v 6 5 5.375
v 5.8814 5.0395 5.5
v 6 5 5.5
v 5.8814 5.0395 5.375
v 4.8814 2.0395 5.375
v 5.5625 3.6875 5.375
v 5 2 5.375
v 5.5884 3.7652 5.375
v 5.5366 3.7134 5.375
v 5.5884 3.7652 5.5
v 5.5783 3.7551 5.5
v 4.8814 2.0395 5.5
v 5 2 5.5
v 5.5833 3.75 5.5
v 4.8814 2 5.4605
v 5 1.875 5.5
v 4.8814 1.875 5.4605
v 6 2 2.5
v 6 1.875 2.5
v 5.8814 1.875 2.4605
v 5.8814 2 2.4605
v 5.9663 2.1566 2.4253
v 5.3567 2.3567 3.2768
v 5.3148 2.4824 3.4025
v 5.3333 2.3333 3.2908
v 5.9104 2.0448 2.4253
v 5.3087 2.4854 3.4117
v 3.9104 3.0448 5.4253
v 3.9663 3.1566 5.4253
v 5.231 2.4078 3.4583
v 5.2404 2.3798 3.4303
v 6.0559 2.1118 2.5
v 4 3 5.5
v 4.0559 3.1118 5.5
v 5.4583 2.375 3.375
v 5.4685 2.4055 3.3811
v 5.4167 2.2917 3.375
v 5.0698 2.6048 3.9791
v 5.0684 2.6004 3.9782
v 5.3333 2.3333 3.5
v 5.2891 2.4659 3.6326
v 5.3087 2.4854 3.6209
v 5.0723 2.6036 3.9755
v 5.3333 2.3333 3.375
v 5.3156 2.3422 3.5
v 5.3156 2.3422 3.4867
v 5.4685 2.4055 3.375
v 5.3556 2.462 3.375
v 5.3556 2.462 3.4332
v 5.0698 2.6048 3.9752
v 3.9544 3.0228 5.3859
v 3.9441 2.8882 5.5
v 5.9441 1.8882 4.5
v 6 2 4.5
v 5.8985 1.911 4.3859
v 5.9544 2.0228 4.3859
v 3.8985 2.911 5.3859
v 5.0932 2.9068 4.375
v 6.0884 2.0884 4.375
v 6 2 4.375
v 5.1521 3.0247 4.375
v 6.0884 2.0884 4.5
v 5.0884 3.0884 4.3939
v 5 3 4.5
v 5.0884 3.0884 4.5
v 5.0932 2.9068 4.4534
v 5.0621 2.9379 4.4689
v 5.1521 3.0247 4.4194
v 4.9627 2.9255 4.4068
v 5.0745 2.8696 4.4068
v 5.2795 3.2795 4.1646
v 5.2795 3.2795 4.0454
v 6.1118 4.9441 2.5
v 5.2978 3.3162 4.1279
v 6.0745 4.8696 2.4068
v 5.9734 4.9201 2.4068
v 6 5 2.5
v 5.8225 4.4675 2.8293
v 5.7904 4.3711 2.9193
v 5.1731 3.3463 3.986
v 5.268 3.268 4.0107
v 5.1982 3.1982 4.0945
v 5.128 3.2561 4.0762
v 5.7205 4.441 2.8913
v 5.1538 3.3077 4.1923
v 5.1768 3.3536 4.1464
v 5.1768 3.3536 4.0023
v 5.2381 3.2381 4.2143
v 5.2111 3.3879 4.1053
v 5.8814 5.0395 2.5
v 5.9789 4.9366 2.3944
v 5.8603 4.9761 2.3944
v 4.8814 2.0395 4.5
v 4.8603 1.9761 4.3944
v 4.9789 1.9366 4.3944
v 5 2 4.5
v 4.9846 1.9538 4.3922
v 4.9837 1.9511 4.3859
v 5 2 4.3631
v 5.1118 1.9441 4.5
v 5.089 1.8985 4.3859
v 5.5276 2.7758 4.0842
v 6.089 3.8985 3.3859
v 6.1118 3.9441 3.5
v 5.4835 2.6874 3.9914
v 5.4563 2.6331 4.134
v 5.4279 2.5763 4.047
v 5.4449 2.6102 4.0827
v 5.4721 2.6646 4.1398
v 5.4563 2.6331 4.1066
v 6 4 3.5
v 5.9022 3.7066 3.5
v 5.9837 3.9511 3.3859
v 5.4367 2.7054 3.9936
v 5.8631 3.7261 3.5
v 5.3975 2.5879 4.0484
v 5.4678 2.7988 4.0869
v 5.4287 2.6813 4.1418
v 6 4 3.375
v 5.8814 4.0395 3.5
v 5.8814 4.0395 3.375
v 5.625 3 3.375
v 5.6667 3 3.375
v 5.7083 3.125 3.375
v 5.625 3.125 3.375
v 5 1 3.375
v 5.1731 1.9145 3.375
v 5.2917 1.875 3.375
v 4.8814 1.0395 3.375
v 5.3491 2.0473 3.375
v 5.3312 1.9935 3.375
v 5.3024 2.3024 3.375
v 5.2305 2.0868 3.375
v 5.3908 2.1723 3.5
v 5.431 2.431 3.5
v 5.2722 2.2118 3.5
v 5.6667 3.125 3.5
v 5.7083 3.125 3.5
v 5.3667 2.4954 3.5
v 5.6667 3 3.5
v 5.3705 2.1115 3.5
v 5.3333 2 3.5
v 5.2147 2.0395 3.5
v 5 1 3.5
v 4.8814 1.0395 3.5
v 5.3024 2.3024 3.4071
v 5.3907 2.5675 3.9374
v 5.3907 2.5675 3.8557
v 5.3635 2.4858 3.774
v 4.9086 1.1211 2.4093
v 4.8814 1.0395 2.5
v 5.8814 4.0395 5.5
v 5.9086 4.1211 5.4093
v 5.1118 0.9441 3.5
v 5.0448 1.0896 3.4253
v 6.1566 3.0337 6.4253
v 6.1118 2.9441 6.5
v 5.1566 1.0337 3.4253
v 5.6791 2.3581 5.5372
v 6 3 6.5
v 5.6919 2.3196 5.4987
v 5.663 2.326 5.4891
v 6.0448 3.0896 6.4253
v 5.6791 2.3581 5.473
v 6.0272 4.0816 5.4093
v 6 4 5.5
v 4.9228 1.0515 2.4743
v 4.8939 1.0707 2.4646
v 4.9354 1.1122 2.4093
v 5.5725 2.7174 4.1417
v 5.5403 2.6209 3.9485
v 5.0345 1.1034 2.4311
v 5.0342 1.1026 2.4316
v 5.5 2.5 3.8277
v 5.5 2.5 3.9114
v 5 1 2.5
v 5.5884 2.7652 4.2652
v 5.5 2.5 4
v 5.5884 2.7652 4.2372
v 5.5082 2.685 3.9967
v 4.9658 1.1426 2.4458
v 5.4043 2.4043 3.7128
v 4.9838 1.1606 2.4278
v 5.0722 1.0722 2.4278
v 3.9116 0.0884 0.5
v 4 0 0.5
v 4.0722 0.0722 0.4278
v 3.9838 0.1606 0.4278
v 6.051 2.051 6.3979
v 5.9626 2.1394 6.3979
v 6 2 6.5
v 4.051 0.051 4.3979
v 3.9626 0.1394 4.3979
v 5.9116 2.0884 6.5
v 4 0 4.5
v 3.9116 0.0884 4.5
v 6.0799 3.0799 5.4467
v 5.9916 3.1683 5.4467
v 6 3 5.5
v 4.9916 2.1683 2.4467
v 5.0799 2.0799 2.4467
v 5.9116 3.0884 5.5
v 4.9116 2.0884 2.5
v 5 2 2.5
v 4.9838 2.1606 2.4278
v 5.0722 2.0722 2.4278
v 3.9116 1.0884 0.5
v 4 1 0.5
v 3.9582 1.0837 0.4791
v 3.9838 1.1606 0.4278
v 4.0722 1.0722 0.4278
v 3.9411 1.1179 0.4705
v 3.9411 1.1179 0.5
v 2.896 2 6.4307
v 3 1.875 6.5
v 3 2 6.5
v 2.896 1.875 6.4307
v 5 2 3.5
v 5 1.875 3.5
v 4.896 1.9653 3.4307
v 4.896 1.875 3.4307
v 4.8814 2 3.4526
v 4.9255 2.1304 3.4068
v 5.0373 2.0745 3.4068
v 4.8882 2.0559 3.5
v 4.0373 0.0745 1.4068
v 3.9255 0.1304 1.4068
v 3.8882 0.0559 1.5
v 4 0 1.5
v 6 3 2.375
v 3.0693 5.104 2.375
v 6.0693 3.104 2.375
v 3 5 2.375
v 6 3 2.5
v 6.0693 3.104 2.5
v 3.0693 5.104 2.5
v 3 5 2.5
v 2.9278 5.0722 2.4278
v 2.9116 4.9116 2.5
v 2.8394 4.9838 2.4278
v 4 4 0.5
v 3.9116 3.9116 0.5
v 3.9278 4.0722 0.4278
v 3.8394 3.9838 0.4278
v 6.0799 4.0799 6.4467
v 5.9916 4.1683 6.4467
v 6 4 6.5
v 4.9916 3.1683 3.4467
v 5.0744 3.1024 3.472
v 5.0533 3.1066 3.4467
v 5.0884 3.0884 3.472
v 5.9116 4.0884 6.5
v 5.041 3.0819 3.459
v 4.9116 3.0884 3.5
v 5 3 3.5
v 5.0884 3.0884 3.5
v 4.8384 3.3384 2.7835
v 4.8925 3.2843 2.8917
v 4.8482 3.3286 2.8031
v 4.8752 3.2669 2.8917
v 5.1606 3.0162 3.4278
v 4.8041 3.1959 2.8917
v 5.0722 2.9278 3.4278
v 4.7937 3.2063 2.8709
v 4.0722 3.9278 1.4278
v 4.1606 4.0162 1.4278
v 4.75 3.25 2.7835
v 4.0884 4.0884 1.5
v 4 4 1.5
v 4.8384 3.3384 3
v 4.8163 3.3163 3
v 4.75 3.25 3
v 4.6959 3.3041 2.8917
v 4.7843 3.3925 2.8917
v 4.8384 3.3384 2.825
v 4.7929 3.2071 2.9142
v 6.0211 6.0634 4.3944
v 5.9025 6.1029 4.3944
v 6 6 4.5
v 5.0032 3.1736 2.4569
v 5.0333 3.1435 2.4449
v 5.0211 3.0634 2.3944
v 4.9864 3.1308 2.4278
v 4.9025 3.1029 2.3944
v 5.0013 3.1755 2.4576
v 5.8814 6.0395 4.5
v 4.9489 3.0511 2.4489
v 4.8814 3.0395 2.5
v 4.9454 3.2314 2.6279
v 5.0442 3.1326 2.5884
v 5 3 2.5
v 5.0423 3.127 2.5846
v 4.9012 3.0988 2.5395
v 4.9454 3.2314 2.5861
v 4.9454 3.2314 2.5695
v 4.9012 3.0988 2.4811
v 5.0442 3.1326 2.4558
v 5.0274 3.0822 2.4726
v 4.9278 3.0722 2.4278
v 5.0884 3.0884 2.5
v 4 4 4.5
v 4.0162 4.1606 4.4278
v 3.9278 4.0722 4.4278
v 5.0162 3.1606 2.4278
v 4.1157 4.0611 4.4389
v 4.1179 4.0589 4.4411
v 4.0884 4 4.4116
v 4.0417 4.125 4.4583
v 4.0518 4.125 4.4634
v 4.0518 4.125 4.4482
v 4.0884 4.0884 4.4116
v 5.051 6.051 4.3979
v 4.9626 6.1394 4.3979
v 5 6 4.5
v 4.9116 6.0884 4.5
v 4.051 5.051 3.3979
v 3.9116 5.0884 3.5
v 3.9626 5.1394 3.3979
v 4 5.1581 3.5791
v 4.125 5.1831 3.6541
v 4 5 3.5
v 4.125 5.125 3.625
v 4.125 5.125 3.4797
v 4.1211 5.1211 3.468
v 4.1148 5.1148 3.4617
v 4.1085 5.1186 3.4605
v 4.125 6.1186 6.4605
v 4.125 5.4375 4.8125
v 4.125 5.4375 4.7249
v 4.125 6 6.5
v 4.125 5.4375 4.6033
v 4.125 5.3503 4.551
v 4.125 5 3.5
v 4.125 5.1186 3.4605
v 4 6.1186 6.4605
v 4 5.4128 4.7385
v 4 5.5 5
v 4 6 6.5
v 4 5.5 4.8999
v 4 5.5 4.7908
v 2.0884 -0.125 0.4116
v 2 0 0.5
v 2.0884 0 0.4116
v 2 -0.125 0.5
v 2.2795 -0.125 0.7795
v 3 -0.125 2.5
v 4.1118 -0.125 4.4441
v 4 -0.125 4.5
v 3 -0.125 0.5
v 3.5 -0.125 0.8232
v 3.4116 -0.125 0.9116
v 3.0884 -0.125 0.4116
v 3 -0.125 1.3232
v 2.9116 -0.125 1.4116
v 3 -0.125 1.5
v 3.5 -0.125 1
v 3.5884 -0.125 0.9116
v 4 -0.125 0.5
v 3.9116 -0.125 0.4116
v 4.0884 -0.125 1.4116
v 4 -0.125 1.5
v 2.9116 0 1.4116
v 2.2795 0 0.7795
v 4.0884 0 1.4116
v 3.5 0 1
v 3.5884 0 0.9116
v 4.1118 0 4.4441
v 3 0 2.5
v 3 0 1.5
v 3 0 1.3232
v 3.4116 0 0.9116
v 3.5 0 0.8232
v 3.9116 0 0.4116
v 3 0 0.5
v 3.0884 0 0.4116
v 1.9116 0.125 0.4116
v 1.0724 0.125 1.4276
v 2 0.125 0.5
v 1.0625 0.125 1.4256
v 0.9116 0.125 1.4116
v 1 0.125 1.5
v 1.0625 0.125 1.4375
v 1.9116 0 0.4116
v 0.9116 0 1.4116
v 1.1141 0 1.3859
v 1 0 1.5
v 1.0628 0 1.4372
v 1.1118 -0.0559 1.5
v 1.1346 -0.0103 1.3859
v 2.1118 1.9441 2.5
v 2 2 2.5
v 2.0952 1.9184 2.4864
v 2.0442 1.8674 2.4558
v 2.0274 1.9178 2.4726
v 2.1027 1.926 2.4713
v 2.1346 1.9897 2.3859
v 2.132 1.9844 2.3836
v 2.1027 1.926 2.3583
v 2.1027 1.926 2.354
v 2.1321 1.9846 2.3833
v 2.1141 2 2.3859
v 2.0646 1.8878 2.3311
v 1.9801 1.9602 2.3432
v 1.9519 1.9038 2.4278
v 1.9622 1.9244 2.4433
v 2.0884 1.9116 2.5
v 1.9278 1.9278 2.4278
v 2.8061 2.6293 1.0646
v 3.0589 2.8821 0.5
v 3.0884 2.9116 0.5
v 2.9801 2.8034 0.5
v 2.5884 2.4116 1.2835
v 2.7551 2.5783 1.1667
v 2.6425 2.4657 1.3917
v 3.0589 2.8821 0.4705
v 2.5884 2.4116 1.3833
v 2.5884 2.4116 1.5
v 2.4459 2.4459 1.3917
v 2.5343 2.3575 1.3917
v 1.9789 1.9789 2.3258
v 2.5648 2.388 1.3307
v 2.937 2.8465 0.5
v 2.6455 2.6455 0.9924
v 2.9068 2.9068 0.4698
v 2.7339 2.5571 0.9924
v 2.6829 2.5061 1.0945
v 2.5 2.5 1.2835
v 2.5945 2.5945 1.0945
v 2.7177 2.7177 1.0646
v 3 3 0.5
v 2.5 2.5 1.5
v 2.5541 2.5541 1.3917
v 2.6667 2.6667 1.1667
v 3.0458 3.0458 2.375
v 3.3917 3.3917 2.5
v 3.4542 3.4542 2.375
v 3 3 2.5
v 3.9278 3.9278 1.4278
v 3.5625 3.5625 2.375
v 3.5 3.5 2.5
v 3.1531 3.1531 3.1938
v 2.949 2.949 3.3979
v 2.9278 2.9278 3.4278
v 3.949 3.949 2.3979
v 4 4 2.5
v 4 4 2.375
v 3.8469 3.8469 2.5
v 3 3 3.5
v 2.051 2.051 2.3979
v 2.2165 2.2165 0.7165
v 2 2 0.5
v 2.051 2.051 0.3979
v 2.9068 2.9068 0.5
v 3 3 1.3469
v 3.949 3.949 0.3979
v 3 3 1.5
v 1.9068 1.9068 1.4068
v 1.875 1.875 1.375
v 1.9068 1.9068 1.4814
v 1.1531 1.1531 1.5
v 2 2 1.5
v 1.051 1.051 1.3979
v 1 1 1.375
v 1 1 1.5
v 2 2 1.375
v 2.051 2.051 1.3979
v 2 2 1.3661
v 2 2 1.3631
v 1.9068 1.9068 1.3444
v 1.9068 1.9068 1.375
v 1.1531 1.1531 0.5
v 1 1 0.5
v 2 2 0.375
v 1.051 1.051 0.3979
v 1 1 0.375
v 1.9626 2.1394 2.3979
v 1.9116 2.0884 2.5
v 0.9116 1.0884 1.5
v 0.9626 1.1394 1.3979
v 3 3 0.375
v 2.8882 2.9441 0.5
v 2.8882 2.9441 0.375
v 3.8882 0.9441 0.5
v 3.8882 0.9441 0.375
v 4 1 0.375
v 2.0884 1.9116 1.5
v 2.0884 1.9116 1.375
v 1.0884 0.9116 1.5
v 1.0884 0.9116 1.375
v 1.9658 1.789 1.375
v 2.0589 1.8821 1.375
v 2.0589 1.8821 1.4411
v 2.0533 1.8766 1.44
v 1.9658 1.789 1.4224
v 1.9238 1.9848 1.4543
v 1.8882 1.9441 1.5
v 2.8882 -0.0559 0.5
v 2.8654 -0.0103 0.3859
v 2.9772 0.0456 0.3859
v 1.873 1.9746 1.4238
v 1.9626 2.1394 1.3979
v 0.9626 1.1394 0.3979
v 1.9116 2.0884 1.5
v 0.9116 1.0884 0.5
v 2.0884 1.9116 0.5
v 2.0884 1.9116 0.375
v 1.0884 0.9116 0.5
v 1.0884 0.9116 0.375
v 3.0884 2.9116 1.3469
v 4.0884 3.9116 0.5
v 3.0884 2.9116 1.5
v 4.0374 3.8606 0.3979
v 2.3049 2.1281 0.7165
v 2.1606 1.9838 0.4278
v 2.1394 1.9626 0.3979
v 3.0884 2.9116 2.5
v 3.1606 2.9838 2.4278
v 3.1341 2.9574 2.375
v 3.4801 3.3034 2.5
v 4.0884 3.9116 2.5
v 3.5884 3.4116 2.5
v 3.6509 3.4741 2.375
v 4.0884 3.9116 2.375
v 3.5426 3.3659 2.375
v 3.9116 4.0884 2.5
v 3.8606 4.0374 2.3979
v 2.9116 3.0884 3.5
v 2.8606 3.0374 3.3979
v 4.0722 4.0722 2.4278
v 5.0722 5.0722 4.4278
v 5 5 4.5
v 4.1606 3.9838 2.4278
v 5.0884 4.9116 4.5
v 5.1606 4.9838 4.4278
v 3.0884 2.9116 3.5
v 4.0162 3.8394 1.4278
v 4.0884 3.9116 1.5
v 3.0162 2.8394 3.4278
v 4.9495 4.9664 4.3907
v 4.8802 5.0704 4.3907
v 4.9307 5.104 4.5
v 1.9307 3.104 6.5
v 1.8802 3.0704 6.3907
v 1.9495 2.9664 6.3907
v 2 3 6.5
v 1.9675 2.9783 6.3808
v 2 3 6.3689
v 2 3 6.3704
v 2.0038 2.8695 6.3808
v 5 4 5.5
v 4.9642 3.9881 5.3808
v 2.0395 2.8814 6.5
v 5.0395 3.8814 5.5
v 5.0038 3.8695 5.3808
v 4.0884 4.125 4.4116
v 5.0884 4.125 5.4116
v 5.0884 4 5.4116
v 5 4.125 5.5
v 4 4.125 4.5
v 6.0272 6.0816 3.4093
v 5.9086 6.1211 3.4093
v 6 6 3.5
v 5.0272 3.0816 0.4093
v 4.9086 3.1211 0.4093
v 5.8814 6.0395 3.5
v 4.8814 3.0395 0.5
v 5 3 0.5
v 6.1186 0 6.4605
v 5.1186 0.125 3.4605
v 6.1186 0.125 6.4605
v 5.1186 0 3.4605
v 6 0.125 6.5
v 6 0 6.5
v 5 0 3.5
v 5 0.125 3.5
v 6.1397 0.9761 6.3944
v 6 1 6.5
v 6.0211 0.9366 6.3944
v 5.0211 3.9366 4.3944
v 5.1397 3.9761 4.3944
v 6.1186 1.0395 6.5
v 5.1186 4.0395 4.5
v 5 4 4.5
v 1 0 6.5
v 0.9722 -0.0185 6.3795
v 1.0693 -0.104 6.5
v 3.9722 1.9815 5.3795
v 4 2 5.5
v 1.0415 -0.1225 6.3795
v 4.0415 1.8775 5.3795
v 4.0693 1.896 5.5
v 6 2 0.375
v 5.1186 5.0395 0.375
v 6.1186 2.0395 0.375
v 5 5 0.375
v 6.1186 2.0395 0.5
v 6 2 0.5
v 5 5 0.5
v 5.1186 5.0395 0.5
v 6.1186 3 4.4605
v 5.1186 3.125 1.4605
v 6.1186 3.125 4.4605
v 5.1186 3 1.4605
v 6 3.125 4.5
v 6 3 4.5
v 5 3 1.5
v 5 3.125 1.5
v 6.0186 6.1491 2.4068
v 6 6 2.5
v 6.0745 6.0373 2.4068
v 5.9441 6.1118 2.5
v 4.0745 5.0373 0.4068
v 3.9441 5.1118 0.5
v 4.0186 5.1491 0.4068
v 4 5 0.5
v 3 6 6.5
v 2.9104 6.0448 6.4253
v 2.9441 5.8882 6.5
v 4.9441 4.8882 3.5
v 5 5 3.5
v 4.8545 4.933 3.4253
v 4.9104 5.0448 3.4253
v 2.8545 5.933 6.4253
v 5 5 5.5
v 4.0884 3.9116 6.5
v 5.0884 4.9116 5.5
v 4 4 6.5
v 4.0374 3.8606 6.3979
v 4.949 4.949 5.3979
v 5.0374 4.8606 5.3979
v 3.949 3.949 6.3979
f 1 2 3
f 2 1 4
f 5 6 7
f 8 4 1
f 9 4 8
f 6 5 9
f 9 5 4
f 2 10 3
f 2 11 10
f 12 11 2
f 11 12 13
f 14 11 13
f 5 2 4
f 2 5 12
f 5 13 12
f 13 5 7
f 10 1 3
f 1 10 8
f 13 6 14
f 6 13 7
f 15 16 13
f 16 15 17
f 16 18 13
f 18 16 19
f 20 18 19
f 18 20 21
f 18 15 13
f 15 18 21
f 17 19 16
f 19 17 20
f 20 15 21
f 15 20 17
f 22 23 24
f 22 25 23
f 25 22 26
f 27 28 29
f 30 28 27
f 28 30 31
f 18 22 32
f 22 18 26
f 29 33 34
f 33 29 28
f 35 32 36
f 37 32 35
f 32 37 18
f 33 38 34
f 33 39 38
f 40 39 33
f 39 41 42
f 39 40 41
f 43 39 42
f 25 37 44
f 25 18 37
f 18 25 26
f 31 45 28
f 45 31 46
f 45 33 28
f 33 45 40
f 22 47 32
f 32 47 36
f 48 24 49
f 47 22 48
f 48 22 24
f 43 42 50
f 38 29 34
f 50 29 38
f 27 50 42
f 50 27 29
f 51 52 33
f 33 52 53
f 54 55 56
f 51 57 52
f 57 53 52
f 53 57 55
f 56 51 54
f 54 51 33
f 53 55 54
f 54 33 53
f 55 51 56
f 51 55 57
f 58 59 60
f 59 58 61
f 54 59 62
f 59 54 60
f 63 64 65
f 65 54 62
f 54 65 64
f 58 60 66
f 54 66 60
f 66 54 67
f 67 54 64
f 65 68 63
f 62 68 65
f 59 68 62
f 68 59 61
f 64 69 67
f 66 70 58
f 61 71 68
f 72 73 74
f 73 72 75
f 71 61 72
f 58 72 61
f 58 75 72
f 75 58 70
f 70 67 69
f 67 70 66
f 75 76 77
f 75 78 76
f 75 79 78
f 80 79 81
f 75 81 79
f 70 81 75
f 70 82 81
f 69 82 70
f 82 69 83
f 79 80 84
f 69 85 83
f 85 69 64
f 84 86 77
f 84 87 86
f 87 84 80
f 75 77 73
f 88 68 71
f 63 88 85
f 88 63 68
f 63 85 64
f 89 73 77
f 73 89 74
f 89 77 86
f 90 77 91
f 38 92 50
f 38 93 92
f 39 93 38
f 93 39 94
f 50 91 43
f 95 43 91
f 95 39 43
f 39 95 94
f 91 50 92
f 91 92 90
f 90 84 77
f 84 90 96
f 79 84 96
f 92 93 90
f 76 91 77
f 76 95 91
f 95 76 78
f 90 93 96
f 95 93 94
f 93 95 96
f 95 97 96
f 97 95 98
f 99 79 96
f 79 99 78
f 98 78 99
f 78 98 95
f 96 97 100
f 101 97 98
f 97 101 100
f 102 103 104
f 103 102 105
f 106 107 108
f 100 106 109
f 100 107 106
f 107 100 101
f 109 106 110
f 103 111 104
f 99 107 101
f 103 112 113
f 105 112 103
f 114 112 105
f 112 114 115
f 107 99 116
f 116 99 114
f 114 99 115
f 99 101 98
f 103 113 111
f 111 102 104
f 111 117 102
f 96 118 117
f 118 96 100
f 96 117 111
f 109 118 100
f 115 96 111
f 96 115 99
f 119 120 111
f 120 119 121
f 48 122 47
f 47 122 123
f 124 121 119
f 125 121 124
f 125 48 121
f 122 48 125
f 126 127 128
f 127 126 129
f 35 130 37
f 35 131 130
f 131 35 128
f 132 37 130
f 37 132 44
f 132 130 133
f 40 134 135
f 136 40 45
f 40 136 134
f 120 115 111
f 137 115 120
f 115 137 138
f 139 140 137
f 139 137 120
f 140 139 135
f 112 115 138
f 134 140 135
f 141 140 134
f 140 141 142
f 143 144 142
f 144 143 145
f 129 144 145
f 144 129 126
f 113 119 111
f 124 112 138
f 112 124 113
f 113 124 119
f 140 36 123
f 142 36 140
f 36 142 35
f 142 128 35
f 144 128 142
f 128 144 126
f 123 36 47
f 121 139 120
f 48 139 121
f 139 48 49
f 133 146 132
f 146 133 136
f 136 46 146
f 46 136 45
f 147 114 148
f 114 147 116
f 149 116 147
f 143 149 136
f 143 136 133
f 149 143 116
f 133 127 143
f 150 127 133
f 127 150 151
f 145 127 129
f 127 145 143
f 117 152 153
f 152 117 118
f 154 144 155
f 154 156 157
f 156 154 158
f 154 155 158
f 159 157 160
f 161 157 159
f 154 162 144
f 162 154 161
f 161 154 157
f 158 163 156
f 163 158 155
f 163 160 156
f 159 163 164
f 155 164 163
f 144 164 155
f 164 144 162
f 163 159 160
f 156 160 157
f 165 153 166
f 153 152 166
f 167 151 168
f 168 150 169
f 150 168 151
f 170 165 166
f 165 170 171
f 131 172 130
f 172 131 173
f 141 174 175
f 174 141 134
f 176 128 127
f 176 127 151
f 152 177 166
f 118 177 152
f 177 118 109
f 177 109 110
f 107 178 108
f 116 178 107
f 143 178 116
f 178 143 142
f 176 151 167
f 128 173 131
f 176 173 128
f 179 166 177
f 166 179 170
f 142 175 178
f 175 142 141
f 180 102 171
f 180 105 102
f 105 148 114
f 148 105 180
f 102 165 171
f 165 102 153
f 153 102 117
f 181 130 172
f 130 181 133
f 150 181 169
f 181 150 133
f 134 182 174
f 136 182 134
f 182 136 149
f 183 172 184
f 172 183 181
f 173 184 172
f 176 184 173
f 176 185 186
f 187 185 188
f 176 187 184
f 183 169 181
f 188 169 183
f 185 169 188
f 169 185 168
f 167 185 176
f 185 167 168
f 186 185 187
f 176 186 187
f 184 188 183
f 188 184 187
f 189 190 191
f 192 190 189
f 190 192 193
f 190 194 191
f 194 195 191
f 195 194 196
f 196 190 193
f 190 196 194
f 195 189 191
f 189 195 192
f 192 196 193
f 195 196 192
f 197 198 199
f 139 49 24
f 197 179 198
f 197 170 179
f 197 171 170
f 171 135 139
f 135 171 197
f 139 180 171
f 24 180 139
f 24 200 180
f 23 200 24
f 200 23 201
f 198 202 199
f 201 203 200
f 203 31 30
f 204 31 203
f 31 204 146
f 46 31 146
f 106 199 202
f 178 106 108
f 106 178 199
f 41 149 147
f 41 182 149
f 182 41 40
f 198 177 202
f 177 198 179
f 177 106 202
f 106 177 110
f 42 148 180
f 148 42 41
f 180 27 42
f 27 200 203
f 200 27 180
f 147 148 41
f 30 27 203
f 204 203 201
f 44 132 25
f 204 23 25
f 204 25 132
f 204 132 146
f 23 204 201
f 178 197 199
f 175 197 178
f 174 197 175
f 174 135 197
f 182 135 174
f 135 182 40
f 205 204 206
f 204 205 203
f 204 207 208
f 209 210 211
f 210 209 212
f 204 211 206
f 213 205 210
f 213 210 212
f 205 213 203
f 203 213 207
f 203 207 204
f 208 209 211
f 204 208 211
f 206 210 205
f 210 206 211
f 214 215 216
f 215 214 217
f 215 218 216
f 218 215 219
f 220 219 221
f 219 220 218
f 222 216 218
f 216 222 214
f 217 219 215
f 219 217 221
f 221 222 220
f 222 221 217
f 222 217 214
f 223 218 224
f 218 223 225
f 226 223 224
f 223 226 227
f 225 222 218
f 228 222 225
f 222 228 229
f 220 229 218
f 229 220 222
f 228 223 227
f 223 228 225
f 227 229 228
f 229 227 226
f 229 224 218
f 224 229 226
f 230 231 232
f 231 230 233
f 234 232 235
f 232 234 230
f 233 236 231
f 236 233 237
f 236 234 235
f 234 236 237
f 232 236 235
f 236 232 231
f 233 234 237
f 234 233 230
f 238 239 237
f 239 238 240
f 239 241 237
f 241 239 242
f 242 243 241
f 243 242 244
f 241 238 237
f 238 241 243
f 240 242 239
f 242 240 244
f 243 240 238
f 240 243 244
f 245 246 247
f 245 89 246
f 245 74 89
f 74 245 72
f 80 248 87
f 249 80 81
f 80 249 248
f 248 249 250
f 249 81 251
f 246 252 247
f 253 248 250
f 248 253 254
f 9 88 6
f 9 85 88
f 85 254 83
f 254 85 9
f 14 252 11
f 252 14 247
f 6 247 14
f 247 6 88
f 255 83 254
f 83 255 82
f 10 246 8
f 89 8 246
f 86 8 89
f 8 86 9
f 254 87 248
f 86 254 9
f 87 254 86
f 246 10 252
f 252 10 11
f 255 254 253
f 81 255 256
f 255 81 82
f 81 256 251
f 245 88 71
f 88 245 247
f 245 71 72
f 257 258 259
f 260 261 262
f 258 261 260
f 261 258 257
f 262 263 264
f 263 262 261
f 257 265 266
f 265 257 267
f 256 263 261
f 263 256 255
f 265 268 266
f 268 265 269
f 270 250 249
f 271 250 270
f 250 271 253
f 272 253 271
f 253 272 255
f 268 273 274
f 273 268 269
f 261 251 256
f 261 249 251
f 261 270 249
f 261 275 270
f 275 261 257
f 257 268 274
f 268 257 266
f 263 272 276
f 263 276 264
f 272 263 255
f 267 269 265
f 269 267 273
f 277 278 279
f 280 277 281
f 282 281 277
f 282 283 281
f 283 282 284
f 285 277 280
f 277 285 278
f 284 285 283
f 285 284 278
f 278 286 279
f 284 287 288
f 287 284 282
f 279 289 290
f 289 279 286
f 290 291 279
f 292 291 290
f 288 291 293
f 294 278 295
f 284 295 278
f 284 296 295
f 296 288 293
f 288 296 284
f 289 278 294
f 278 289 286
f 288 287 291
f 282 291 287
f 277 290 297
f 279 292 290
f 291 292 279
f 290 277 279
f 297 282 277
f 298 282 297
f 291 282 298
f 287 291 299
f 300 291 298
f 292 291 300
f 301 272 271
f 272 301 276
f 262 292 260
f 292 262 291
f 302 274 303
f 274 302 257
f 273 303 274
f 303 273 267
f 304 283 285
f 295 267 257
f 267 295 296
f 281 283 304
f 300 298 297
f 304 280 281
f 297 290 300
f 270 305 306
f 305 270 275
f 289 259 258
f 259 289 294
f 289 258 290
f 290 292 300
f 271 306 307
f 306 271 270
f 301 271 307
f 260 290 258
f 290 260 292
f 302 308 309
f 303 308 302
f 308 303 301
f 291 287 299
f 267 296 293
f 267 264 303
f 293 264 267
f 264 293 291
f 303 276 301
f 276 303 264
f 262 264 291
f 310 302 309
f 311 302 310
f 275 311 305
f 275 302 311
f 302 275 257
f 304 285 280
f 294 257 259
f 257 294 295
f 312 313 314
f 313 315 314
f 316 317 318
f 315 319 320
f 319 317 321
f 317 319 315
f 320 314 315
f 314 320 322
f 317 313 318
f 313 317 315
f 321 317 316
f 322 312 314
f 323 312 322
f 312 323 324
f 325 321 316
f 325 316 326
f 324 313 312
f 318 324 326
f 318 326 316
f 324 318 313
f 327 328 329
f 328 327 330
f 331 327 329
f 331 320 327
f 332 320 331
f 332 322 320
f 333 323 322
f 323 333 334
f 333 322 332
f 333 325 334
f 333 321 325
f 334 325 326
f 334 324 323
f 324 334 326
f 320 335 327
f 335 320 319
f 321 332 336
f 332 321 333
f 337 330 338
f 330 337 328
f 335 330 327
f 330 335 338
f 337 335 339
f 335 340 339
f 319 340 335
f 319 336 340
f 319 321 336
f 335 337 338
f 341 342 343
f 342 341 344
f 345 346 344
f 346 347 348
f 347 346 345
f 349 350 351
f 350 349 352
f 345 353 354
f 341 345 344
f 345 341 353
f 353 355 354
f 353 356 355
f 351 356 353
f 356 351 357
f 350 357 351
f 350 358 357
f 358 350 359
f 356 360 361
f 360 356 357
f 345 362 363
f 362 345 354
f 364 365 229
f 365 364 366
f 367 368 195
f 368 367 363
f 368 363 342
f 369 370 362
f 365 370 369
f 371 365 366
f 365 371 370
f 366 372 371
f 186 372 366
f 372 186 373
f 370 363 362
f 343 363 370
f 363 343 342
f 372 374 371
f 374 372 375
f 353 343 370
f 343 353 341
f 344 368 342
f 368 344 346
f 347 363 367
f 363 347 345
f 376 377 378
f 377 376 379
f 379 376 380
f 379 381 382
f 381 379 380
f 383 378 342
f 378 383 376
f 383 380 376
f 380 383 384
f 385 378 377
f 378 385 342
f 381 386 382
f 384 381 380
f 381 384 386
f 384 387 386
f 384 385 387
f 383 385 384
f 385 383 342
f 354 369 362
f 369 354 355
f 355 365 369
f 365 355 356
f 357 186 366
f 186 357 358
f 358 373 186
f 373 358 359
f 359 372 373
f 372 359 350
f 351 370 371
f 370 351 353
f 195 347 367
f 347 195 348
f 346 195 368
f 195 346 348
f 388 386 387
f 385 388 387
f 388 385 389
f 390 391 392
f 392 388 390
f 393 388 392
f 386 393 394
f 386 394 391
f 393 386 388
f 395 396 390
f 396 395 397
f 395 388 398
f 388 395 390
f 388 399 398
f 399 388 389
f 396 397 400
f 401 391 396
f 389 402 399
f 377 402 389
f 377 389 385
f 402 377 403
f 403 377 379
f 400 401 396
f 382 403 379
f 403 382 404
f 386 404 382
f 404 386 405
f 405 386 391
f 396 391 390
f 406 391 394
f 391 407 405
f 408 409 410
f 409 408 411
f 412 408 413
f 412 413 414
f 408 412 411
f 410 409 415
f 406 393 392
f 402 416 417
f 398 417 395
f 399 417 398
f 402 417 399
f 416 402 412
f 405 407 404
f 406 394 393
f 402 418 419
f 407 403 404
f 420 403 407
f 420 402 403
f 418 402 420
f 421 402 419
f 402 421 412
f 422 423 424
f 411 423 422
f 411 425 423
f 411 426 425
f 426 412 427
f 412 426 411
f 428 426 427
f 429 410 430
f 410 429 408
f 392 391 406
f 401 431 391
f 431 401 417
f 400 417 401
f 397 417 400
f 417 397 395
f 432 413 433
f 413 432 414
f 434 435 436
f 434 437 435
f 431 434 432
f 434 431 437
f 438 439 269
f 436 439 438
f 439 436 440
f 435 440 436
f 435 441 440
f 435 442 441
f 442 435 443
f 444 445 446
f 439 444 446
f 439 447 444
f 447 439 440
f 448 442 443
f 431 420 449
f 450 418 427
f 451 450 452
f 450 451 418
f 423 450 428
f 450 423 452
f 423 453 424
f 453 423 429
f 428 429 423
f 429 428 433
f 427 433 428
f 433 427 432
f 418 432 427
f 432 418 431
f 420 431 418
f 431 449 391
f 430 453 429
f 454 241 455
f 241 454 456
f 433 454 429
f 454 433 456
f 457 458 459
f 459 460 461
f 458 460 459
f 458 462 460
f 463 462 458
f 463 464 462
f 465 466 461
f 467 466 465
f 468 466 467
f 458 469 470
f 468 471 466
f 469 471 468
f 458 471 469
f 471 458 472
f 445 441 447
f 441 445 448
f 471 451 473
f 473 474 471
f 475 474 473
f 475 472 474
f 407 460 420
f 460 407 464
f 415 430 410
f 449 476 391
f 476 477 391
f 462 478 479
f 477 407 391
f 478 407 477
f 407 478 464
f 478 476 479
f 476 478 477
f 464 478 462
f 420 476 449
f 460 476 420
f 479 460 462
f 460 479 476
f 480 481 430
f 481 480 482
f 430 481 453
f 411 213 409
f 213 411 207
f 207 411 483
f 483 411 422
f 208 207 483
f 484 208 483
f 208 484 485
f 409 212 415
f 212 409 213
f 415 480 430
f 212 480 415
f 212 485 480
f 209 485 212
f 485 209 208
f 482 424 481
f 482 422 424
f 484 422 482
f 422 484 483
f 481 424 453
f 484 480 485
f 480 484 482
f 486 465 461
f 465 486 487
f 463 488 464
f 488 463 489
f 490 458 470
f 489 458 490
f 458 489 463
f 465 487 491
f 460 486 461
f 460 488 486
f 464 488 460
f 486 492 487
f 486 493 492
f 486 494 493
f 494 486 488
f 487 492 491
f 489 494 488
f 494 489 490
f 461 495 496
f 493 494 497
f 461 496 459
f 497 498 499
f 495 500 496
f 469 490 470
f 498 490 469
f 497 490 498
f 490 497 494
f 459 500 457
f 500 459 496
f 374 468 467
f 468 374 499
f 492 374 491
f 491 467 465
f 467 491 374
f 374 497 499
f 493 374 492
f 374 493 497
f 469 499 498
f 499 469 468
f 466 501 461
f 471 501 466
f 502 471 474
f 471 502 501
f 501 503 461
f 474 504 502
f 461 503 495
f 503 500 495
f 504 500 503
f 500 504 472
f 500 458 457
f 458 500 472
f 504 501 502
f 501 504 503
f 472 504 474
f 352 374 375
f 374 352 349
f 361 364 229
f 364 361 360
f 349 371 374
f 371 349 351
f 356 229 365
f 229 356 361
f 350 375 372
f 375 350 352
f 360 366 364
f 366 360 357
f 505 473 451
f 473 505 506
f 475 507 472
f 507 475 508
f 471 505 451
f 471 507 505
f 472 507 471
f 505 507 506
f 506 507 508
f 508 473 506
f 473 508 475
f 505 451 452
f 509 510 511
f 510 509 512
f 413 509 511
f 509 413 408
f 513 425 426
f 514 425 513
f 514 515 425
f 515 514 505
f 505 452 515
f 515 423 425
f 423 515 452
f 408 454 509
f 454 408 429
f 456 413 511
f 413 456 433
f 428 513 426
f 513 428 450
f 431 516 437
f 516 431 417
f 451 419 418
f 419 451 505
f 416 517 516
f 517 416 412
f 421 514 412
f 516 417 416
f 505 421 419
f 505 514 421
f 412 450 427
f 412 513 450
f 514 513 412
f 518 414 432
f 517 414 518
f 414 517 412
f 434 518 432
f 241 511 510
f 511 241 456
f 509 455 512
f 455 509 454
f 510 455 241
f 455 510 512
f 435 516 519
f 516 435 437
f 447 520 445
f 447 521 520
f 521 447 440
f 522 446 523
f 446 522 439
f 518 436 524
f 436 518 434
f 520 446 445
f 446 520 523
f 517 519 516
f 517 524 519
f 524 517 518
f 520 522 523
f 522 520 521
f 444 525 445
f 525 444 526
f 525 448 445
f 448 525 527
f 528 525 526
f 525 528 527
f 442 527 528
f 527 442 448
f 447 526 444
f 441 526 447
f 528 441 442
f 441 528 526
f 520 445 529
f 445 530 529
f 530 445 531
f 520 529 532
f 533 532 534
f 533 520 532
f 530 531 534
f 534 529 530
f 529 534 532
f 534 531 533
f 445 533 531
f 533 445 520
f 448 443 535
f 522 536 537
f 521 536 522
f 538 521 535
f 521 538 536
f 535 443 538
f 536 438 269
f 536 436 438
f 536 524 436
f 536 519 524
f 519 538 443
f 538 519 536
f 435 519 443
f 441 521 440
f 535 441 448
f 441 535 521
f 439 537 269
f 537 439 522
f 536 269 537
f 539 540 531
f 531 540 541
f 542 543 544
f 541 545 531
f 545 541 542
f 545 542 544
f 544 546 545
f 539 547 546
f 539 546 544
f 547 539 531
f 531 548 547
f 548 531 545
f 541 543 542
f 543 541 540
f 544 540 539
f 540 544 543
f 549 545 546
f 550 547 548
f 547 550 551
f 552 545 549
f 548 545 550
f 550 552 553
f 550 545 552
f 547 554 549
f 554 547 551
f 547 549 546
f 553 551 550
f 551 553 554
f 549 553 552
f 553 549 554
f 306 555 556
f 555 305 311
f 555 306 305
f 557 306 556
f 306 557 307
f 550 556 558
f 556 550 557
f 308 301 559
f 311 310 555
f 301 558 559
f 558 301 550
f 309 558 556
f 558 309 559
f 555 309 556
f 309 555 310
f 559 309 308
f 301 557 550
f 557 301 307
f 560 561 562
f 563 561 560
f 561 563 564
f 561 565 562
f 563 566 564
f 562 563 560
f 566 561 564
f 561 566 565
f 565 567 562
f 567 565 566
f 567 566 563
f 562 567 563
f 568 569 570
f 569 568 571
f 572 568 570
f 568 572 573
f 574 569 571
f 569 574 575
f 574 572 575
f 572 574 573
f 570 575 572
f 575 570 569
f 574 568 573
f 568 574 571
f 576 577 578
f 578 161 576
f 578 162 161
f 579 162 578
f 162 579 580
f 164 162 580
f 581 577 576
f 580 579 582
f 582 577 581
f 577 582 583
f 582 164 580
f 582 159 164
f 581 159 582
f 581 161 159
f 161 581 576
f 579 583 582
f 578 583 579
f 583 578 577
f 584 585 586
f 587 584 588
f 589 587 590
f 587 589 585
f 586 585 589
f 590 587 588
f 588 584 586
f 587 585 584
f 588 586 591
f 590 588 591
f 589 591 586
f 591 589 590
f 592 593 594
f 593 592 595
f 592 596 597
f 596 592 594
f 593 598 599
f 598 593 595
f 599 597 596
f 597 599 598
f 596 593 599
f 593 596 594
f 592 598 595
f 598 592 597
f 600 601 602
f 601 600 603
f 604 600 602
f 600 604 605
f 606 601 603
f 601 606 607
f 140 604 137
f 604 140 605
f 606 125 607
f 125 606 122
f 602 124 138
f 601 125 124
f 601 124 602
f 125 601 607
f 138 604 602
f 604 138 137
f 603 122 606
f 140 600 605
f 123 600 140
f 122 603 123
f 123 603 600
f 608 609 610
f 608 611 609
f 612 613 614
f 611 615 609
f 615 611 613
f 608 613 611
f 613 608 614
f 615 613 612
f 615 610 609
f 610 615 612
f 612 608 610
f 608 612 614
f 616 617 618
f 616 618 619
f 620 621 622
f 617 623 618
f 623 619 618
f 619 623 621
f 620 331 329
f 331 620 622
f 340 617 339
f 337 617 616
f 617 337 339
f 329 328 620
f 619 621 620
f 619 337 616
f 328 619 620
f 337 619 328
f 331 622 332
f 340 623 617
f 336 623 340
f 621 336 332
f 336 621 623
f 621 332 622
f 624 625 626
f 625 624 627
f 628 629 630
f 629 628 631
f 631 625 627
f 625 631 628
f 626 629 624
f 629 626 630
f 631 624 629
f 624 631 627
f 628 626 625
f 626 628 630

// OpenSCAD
translate(v = [-0.5, -0.5, 0]) {
	union() {
		%union() {
			union() {
				%cube(size = [0, 0, 0]);
				translate(v = [6.0, 5.0, 5.0]) {
					cube(size = [1, 1, 1]);
				}
				color(alpha = 0.1, c = "lightgreen") {
					translate(v = [5.0, 2.0, 5.0]) {
						cube(size = [1, 1, 1]);
					}
				}
				translate(v = [6.0, 2.0, 2.0]) {
					cube(size = [1, 1, 1]);
				}
				color(alpha = 0.1, c = "lightgreen") {
					translate(v = [4.0, 3.0, 5.0]) {
						cube(size = [1, 1, 1]);
					}
				}
				translate(v = [6.0, 2.0, 4.0]) {
					cube(size = [1, 1, 1]);
				}
				color(alpha = 0.1, c = "lightgreen") {
					translate(v = [5.0, 3.0, 4.0]) {
						cube(size = [1, 1, 1]);
					}
				}
				translate(v = [6.0, 5.0, 2.0]) {
					cube(size = [1, 1, 1]);
				}
				color(alpha = 0.1, c = "lightgreen") {
					translate(v = [5.0, 2.0, 4.0]) {
						cube(size = [1, 1, 1]);
					}
				}
				translate(v = [6.0, 4.0, 3.0]) {
					cube(size = [1, 1, 1]);
				}
				color(alpha = 0.1, c = "lightgreen") {
					translate(v = [5.0, 1.0, 3.0]) {
						cube(size = [1, 1, 1]);
					}
				}
				translate(v = [6.0, 3.0, 6.0]) {
					cube(size = [1, 1, 1]);
				}
				translate(v = [6.0, 4.0, 5.0]) {
					cube(size = [1, 1, 1]);
				}
				color(alpha = 0.1, c = "lightgreen") {
					translate(v = [5.0, 1.0, 2.0]) {
						cube(size = [1, 1, 1]);
					}
				}
				translate(v = [6.0, 2.0, 6.0]) {
					cube(size = [1, 1, 1]);
				}
				color(alpha = 0.1, c = "lightgreen") {
					translate(v = [5.0, 1.0, 5.0]) {
						cube(size = [1, 1, 1]);
					}
				}
				translate(v = [6.0, 3.0, 5.0]) {
					cube(size = [1, 1, 1]);
				}
				color(alpha = 0.1, c = "lightgreen") {
					translate(v = [5.0, 2.0, 2.0]) {
						cube(size = [1, 1, 1]);
					}
				}
				translate(v = [3.0, 2.0, 6.0]) {
					cube(size = [1, 1, 1]);
				}
				color(alpha = 0.1, c = "lightgreen") {
					translate(v = [5.0, 2.0, 3.0]) {
						cube(size = [1, 1, 1]);
					}
				}
				translate(v = [6.0, 3.0, 2.0]) {
					cube(size = [1, 1, 1]);
				}
				color(alpha = 0.1, c = "lightgreen") {
					translate(v = [3.0, 5.0, 2.0]) {
						cube(size = [1, 1, 1]);
					}
				}
				translate(v = [6.0, 4.0, 6.0]) {
					cube(size = [1, 1, 1]);
				}
				color(alpha = 0.1, c = "lightgreen") {
					translate(v = [5.0, 3.0, 3.0]) {
						cube(size = [1, 1, 1]);
					}
				}
				translate(v = [6.0, 6.0, 4.0]) {
					cube(size = [1, 1, 1]);
				}
				color(alpha = 0.1, c = "lightgreen") {
					translate(v = [5.0, 3.0, 2.0]) {
						cube(size = [1, 1, 1]);
					}
				}
				translate(v = [5.0, 6.0, 4.0]) {
					cube(size = [1, 1, 1]);
				}
				color(alpha = 0.1, c = "lightgreen") {
					translate(v = [4.0, 5.0, 3.0]) {
						cube(size = [1, 1, 1]);
					}
				}
				translate(v = [4.0, 2.0, 6.0]) {
					cube(size = [1, 1, 1]);
				}
				translate(v = [2.0, 0.0, 0.0]) {
					cube(size = [1, 1, 1]);
				}
				color(alpha = 0.1, c = "lightgreen") {
					translate(v = [3.0, 0.0, 1.0]) {
						cube(size = [1, 1, 1]);
					}
				}
				color(alpha = 0.1, c = "lightgreen") {
					translate(v = [3.0, 0.0, 2.0]) {
						cube(size = [1, 1, 1]);
					}
				}
				color(alpha = 0.1, c = "lightgreen") {
					translate(v = [1.0, 0.0, 1.0]) {
						cube(size = [1, 1, 1]);
					}
				}
				translate(v = [2.0, 2.0, 2.0]) {
					cube(size = [1, 1, 1]);
				}
				color(alpha = 0.1, c = "lightgreen") {
					translate(v = [3.0, 3.0, 0.0]) {
						cube(size = [1, 1, 1]);
					}
				}
				color(alpha = 0.1, c = "lightgreen") {
					translate(v = [1.0, 1.0, 1.0]) {
						cube(size = [1, 1, 1]);
					}
				}
				translate(v = [2.0, 2.0, 1.0]) {
					cube(size = [1, 1, 1]);
				}
				color(alpha = 0.1, c = "lightgreen") {
					translate(v = [3.0, 0.0, 0.0]) {
						cube(size = [1, 1, 1]);
					}
				}
				color(alpha = 0.1, c = "lightgreen") {
					translate(v = [1.0, 1.0, 0.0]) {
						cube(size = [1, 1, 1]);
					}
				}
				translate(v = [2.0, 2.0, 0.0]) {
					cube(size = [1, 1, 1]);
				}
				color(alpha = 0.1, c = "lightgreen") {
					translate(v = [3.0, 3.0, 1.0]) {
						cube(size = [1, 1, 1]);
					}
				}
				color(alpha = 0.1, c = "lightgreen") {
					translate(v = [3.0, 3.0, 2.0]) {
						cube(size = [1, 1, 1]);
					}
				}
				translate(v = [4.0, 4.0, 2.0]) {
					cube(size = [1, 1, 1]);
				}
				color(alpha = 0.1, c = "lightgreen") {
					translate(v = [3.0, 3.0, 3.0]) {
						cube(size = [1, 1, 1]);
					}
				}
				color(alpha = 0.1, c = "lightgreen") {
					translate(v = [5.0, 5.0, 4.0]) {
						cube(size = [1, 1, 1]);
					}
				}
				translate(v = [2.0, 3.0, 6.0]) {
					cube(size = [1, 1, 1]);
				}
				color(alpha = 0.1, c = "lightgreen") {
					translate(v = [5.0, 4.0, 5.0]) {
						cube(size = [1, 1, 1]);
					}
				}
				translate(v = [4.0, 6.0, 3.0]) {
					cube(size = [1, 1, 1]);
				}
				translate(v = [6.0, 6.0, 3.0]) {
					cube(size = [1, 1, 1]);
				}
				color(alpha = 0.1, c = "lightgreen") {
					translate(v = [5.0, 3.0, 0.0]) {
						cube(size = [1, 1, 1]);
					}
				}
				translate(v = [6.0, 5.0, 6.0]) {
					cube(size = [1, 1, 1]);
				}
				translate(v = [6.0, 4.0, 4.0]) {
					cube(size = [1, 1, 1]);
				}
				translate(v = [6.0, 3.0, 3.0]) {
					cube(size = [1, 1, 1]);
				}
				translate(v = [4.0, 6.0, 2.0]) {
					cube(size = [1, 1, 1]);
				}
				translate(v = [6.0, 2.0, 5.0]) {
					cube(size = [1, 1, 1]);
				}
				translate(v = [6.0, 5.0, 4.0]) {
					cube(size = [1, 1, 1]);
				}
				translate(v = [6.0, 6.0, 6.0]) {
					cube(size = [1, 1, 1]);
				}
				translate(v = [6.0, 0.0, 6.0]) {
					cube(size = [1, 1, 1]);
				}
				color(alpha = 0.1, c = "lightgreen") {
					translate(v = [5.0, 0.0, 3.0]) {
						cube(size = [1, 1, 1]);
					}
				}
				translate(v = [6.0, 1.0, 6.0]) {
					cube(size = [1, 1, 1]);
				}
				color(alpha = 0.1, c = "lightgreen") {
					translate(v = [5.0, 4.0, 4.0]) {
						cube(size = [1, 1, 1]);
					}
				}
				translate(v = [1.0, 0.0, 6.0]) {
					cube(size = [1, 1, 1]);
				}
				color(alpha = 0.1, c = "lightgreen") {
					translate(v = [4.0, 2.0, 5.0]) {
						cube(size = [1, 1, 1]);
					}
				}
				translate(v = [6.0, 2.0, 0.0]) {
					cube(size = [1, 1, 1]);
				}
				color(alpha = 0.1, c = "lightgreen") {
					translate(v = [5.0, 5.0, 0.0]) {
						cube(size = [1, 1, 1]);
					}
				}
				translate(v = [6.0, 3.0, 4.0]) {
					cube(size = [1, 1, 1]);
				}
				color(alpha = 0.1, c = "lightgreen") {
					translate(v = [5.0, 3.0, 1.0]) {
						cube(size = [1, 1, 1]);
					}
				}
				translate(v = [6.0, 6.0, 2.0]) {
					cube(size = [1, 1, 1]);
				}
				color(alpha = 0.1, c = "lightgreen") {
					translate(v = [4.0, 5.0, 0.0]) {
						cube(size = [1, 1, 1]);
					}
				}
				translate(v = [3.0, 6.0, 6.0]) {
					cube(size = [1, 1, 1]);
				}
				color(alpha = 0.1, c = "lightgreen") {
					translate(v = [5.0, 5.0, 3.0]) {
						cube(size = [1, 1, 1]);
					}
				}
				translate(v = [4.0, 4.0, 6.0]) {
					cube(size = [1, 1, 1]);
				}
				color(alpha = 0.1, c = "lightgreen") {
					translate(v = [5.0, 5.0, 5.0]) {
						cube(size = [1, 1, 1]);
					}
				}
				translate(v = [4.0, 0.0, 0.0]) {
					cube(size = [1, 1, 1]);
				}
				translate(v = [4.0, 0.0, 4.0]) {
					cube(size = [1, 1, 1]);
				}
				translate(v = [4.0, 1.0, 0.0]) {
					cube(size = [1, 1, 1]);
				}
				translate(v = [4.0, 0.0, 1.0]) {
					cube(size = [1, 1, 1]);
				}
				translate(v = [4.0, 4.0, 0.0]) {
					cube(size = [1, 1, 1]);
				}
				translate(v = [4.0, 4.0, 1.0]) {
					cube(size = [1, 1, 1]);
				}
				translate(v = [4.0, 4.0, 4.0]) {
					cube(size = [1, 1, 1]);
				}
				translate(v = [4.0, 6.0, 6.0]) {
					cube(size = [1, 1, 1]);
				}
				translate(v = [-6.0, 6.0, -6.0]) {
					cube(size = [1, 1, 1]);
				}
			}
		}
		union() {
			%cube(size = [0, 0, 0]);
			translate(v = [5.5, 2.5, 5.5]) {
				rotate(a = [0, 90.0, 71.56505117707799]) {
					cube(size = [0.125, 0.125, 3.1622776601683795]);
				}
			}
			translate(v = [6.5, 2.5, 2.5]) {
				rotate(a = [0, 18.434948822922017, 180.0]) {
					cube(size = [0.125, 0.125, 3.1622776601683795]);
				}
			}
			translate(v = [4.5, 3.5, 5.5]) {
				rotate(a = [0, 143.30077479951012, -26.56505117707799]) {
					cube(size = [0.125, 0.125, 3.7416573867739413]);
				}
			}
			translate(v = [6.5, 2.5, 4.5]) {
				rotate(a = [0, 65.9051574478893, 153.43494882292202]) {
					cube(size = [0.125, 0.125, 2.449489742783178]);
				}
			}
			translate(v = [5.5, 3.5, 4.5]) {
				rotate(a = [0, 90.0, -45.0]) {
					cube(size = [0.125, 0.125, 1.4142135623730951]);
				}
			}
			translate(v = [6.5, 5.5, 2.5]) {
				rotate(a = [0, 48.189685104221404, -116.56505117707799]) {
					cube(size = [0.125, 0.125, 3.0]);
				}
			}
			translate(v = [5.5, 2.5, 4.5]) {
				rotate(a = [0, 122.31153323742386, 71.56505117707799]) {
					cube(size = [0.125, 0.125, 3.7416573867739413]);
				}
			}
			translate(v = [6.5, 4.5, 3.5]) {
				rotate(a = [0, 65.9051574478893, -116.56505117707799]) {
					cube(size = [0.125, 0.125, 2.449489742783178]);
				}
			}
			translate(v = [5.5, 1.5, 3.5]) {
				rotate(a = [0, 90.0, 71.56505117707799]) {
					cube(size = [0.125, 0.125, 3.1622776601683795]);
				}
			}
			translate(v = [6.5, 3.5, 6.5]) {
				rotate(a = [0, 143.30077479951012, -116.56505117707799]) {
					cube(size = [0.125, 0.125, 3.7416573867739413]);
				}
			}
			translate(v = [5.5, 1.5, 2.5]) {
				rotate(a = [0, 46.50848065490801, 71.56505117707799]) {
					cube(size = [0.125, 0.125, 4.358898943540674]);
				}
			}
			translate(v = [4.5, 0.5, 0.5]) {
				rotate(a = [0, 35.26438968275464, 45.0]) {
					cube(size = [0.125, 0.125, 2.449489742783178]);
				}
			}
			translate(v = [5.5, 1.5, 5.5]) {
				rotate(a = [0, 54.735610317245346, 45.0]) {
					cube(size = [0.125, 0.125, 1.7320508075688772]);
				}
			}
			translate(v = [4.5, 0.5, 4.5]) {
				rotate(a = [0, 54.735610317245346, 45.0]) {
					cube(size = [0.125, 0.125, 1.7320508075688772]);
				}
			}
			translate(v = [5.5, 2.5, 2.5]) {
				rotate(a = [0, 25.239401820678914, 45.0]) {
					cube(size = [0.125, 0.125, 3.3166247903554]);
				}
			}
			translate(v = [4.5, 1.5, 0.5]) {
				rotate(a = [0, 35.26438968275464, 45.0]) {
					cube(size = [0.125, 0.125, 2.449489742783178]);
				}
			}
			translate(v = [5.5, 2.5, 3.5]) {
				rotate(a = [0, 33.690067525979785, 180.0]) {
					cube(size = [0.125, 0.125, 3.605551275463989]);
				}
			}
			translate(v = [4.5, 0.5, 1.5]) {
				rotate(a = [0, 48.189685104221404, 63.43494882292201]) {
					cube(size = [0.125, 0.125, 3.0]);
				}
			}
			translate(v = [3.5, 5.5, 2.5]) {
				rotate(a = [0, 90.0, -33.690067525979785]) {
					cube(size = [0.125, 0.125, 3.605551275463989]);
				}
			}
			translate(v = [4.5, 4.5, 0.5]) {
				rotate(a = [0, 35.26438968275464, 135.0]) {
					cube(size = [0.125, 0.125, 2.449489742783178]);
				}
			}
			translate(v = [5.5, 3.5, 3.5]) {
				rotate(a = [0, 25.239401820678914, 45.0]) {
					cube(size = [0.125, 0.125, 3.3166247903554]);
				}
			}
			translate(v = [4.5, 4.5, 1.5]) {
				rotate(a = [0, 35.26438968275464, -45.0]) {
					cube(size = [0.125, 0.125, 2.449489742783178]);
				}
			}
			translate(v = [5.5, 3.5, 2.5]) {
				rotate(a = [0, 57.68846676257615, 71.56505117707799]) {
					cube(size = [0.125, 0.125, 3.7416573867739413]);
				}
			}
			translate(v = [4.5, 4.5, 4.5]) {
				rotate(a = [0, 144.73561031724537, -45.0]) {
					cube(size = [0.125, 0.125, 2.449489742783178]);
				}
			}
			translate(v = [4.5, 5.5, 3.5]) {
				rotate(a = [0, 54.735610317245346, 45.0]) {
					cube(size = [0.125, 0.125, 1.7320508075688772]);
				}
			}
			translate(v = [4.5, 6.5, 6.5]) {
				rotate(a = [0, 161.56505117707798, -90.0]) {
					cube(size = [0.125, 0.125, 3.1622776601683795]);
				}
			}
			translate(v = [3.5, 0.5, 1.5]) {
				rotate(a = [0, 135.0, 180.0]) {
					cube(size = [0.125, 0.125, 1.4142135623730951]);
				}
			}
			translate(v = [3.5, 0.5, 2.5]) {
				rotate(a = [0, 153.43494882292202, 180.0]) {
					cube(size = [0.125, 0.125, 2.23606797749979]);
				}
			}
			translate(v = [1.5, 0.5, 1.5]) {
				rotate(a = [0, 135.0, 0.0]) {
					cube(size = [0.125, 0.125, 1.4142135623730951]);
				}
			}
			translate(v = [4.5, 0.5, 0.5]) {
				rotate(a = [0, 45.00000000000001, 180.0]) {
					cube(size = [0.125, 0.125, 1.4142135623730951]);
				}
			}
			translate(v = [4.5, 0.5, 4.5]) {
				rotate(a = [0, 153.43494882292202, 180.0]) {
					cube(size = [0.125, 0.125, 2.23606797749979]);
				}
			}
			translate(v = [2.5, 2.5, 2.5]) {
				rotate(a = [0, 114.09484255211072, -116.56505117707799]) {
					cube(size = [0.125, 0.125, 2.449489742783178]);
				}
			}
			translate(v = [3.5, 3.5, 0.5]) {
				rotate(a = [0, 35.26438968275464, -135.0]) {
					cube(size = [0.125, 0.125, 2.449489742783178]);
				}
			}
			translate(v = [1.5, 1.5, 1.5]) {
				rotate(a = [0, 54.735610317245346, 45.0]) {
					cube(size = [0.125, 0.125, 1.7320508075688772]);
				}
			}
			translate(v = [4.5, 1.5, 0.5]) {
				rotate(a = [0, 90.0, 116.56505117707799]) {
					cube(size = [0.125, 0.125, 2.23606797749979]);
				}
			}
			translate(v = [2.5, 2.5, 1.5]) {
				rotate(a = [0, 90.0, -135.0]) {
					cube(size = [0.125, 0.125, 1.4142135623730951]);
				}
			}
			translate(v = [3.5, 0.5, 0.5]) {
				rotate(a = [0, 65.9051574478893, 116.56505117707799]) {
					cube(size = [0.125, 0.125, 2.449489742783178]);
				}
			}
			translate(v = [1.5, 1.5, 0.5]) {
				rotate(a = [0, 54.735610317245346, 45.0]) {
					cube(size = [0.125, 0.125, 1.7320508075688772]);
				}
			}
			translate(v = [4.5, 0.5, 1.5]) {
				rotate(a = [0, 135.0, 180.0]) {
					cube(size = [0.125, 0.125, 1.4142135623730951]);
				}
			}
			translate(v = [2.5, 2.5, 0.5]) {
				rotate(a = [0, 90.0, -135.0]) {
					cube(size = [0.125, 0.125, 1.4142135623730951]);
				}
			}
			translate(v = [3.5, 3.5, 1.5]) {
				rotate(a = [0, 125.26438968275465, -135.0]) {
					cube(size = [0.125, 0.125, 1.7320508075688772]);
				}
			}
			translate(v = [3.5, 3.5, 2.5]) {
				rotate(a = [0, 144.73561031724537, -135.0]) {
					cube(size = [0.125, 0.125, 2.449489742783178]);
				}
			}
			translate(v = [4.5, 4.5, 0.5]) {
				rotate(a = [0, 54.735610317245346, -135.0]) {
					cube(size = [0.125, 0.125, 1.7320508075688772]);
				}
			}
			translate(v = [4.5, 4.5, 2.5]) {
				rotate(a = [0, 90.0, -135.0]) {
					cube(size = [0.125, 0.125, 1.4142135623730951]);
				}
			}
			translate(v = [3.5, 3.5, 3.5]) {
				rotate(a = [0, 125.26438968275465, 45.0]) {
					cube(size = [0.125, 0.125, 1.7320508075688772]);
				}
			}
			translate(v = [5.5, 5.5, 4.5]) {
				rotate(a = [0, 144.73561031724537, -135.0]) {
					cube(size = [0.125, 0.125, 2.449489742783178]);
				}
			}
			translate(v = [4.5, 4.5, 1.5]) {
				rotate(a = [0, 35.26438968275464, -135.0]) {
					cube(size = [0.125, 0.125, 2.449489742783178]);
				}
			}
			translate(v = [2.5, 3.5, 6.5]) {
				rotate(a = [0, 119.01714062460151, 33.690067525979785]) {
					cube(size = [0.125, 0.125, 4.123105625617661]);
				}
			}
			translate(v = [5.5, 4.5, 5.5]) {
				rotate(a = [0, 72.4515993862077, -161.56505117707798]) {
					cube(size = [0.125, 0.125, 3.3166247903554]);
				}
			}
			translate(v = [4.5, 4.5, 4.5]) {
				rotate(a = [0, 45.00000000000001, 0.0]) {
					cube(size = [0.125, 0.125, 1.4142135623730951]);
				}
			}
			translate(v = [5.5, 3.5, 0.5]) {
				rotate(a = [0, 46.50848065490801, 71.56505117707799]) {
					cube(size = [0.125, 0.125, 4.358898943540674]);
				}
			}
			translate(v = [5.5, 0.5, 3.5]) {
				rotate(a = [0, 18.434948822922017, 0.0]) {
					cube(size = [0.125, 0.125, 3.1622776601683795]);
				}
			}
			translate(v = [5.5, 4.5, 4.5]) {
				rotate(a = [0, 57.68846676257615, -71.56505117707799]) {
					cube(size = [0.125, 0.125, 3.7416573867739413]);
				}
			}
			translate(v = [4.5, 2.5, 5.5]) {
				rotate(a = [0, 74.498640433063, -146.30993247402023]) {
					cube(size = [0.125, 0.125, 3.7416573867739413]);
				}
			}
			translate(v = [5.5, 5.5, 0.5]) {
				rotate(a = [0, 90.0, -71.56505117707799]) {
					cube(size = [0.125, 0.125, 3.1622776601683795]);
				}
			}
			translate(v = [5.5, 3.5, 1.5]) {
				rotate(a = [0, 18.434948822922017, 0.0]) {
					cube(size = [0.125, 0.125, 3.1622776601683795]);
				}
			}
			translate(v = [4.5, 5.5, 0.5]) {
				rotate(a = [0, 48.189685104221404, 26.56505117707799]) {
					cube(size = [0.125, 0.125, 3.0]);
				}
			}
			translate(v = [5.5, 5.5, 3.5]) {
				rotate(a = [0, 36.69922520048988, 153.43494882292202]) {
					cube(size = [0.125, 0.125, 3.7416573867739413]);
				}
			}
			translate(v = [5.5, 5.5, 5.5]) {
				rotate(a = [0, 54.735610317245346, -135.0]) {
					cube(size = [0.125, 0.125, 1.7320508075688772]);
				}
			}
		}
	}
}
